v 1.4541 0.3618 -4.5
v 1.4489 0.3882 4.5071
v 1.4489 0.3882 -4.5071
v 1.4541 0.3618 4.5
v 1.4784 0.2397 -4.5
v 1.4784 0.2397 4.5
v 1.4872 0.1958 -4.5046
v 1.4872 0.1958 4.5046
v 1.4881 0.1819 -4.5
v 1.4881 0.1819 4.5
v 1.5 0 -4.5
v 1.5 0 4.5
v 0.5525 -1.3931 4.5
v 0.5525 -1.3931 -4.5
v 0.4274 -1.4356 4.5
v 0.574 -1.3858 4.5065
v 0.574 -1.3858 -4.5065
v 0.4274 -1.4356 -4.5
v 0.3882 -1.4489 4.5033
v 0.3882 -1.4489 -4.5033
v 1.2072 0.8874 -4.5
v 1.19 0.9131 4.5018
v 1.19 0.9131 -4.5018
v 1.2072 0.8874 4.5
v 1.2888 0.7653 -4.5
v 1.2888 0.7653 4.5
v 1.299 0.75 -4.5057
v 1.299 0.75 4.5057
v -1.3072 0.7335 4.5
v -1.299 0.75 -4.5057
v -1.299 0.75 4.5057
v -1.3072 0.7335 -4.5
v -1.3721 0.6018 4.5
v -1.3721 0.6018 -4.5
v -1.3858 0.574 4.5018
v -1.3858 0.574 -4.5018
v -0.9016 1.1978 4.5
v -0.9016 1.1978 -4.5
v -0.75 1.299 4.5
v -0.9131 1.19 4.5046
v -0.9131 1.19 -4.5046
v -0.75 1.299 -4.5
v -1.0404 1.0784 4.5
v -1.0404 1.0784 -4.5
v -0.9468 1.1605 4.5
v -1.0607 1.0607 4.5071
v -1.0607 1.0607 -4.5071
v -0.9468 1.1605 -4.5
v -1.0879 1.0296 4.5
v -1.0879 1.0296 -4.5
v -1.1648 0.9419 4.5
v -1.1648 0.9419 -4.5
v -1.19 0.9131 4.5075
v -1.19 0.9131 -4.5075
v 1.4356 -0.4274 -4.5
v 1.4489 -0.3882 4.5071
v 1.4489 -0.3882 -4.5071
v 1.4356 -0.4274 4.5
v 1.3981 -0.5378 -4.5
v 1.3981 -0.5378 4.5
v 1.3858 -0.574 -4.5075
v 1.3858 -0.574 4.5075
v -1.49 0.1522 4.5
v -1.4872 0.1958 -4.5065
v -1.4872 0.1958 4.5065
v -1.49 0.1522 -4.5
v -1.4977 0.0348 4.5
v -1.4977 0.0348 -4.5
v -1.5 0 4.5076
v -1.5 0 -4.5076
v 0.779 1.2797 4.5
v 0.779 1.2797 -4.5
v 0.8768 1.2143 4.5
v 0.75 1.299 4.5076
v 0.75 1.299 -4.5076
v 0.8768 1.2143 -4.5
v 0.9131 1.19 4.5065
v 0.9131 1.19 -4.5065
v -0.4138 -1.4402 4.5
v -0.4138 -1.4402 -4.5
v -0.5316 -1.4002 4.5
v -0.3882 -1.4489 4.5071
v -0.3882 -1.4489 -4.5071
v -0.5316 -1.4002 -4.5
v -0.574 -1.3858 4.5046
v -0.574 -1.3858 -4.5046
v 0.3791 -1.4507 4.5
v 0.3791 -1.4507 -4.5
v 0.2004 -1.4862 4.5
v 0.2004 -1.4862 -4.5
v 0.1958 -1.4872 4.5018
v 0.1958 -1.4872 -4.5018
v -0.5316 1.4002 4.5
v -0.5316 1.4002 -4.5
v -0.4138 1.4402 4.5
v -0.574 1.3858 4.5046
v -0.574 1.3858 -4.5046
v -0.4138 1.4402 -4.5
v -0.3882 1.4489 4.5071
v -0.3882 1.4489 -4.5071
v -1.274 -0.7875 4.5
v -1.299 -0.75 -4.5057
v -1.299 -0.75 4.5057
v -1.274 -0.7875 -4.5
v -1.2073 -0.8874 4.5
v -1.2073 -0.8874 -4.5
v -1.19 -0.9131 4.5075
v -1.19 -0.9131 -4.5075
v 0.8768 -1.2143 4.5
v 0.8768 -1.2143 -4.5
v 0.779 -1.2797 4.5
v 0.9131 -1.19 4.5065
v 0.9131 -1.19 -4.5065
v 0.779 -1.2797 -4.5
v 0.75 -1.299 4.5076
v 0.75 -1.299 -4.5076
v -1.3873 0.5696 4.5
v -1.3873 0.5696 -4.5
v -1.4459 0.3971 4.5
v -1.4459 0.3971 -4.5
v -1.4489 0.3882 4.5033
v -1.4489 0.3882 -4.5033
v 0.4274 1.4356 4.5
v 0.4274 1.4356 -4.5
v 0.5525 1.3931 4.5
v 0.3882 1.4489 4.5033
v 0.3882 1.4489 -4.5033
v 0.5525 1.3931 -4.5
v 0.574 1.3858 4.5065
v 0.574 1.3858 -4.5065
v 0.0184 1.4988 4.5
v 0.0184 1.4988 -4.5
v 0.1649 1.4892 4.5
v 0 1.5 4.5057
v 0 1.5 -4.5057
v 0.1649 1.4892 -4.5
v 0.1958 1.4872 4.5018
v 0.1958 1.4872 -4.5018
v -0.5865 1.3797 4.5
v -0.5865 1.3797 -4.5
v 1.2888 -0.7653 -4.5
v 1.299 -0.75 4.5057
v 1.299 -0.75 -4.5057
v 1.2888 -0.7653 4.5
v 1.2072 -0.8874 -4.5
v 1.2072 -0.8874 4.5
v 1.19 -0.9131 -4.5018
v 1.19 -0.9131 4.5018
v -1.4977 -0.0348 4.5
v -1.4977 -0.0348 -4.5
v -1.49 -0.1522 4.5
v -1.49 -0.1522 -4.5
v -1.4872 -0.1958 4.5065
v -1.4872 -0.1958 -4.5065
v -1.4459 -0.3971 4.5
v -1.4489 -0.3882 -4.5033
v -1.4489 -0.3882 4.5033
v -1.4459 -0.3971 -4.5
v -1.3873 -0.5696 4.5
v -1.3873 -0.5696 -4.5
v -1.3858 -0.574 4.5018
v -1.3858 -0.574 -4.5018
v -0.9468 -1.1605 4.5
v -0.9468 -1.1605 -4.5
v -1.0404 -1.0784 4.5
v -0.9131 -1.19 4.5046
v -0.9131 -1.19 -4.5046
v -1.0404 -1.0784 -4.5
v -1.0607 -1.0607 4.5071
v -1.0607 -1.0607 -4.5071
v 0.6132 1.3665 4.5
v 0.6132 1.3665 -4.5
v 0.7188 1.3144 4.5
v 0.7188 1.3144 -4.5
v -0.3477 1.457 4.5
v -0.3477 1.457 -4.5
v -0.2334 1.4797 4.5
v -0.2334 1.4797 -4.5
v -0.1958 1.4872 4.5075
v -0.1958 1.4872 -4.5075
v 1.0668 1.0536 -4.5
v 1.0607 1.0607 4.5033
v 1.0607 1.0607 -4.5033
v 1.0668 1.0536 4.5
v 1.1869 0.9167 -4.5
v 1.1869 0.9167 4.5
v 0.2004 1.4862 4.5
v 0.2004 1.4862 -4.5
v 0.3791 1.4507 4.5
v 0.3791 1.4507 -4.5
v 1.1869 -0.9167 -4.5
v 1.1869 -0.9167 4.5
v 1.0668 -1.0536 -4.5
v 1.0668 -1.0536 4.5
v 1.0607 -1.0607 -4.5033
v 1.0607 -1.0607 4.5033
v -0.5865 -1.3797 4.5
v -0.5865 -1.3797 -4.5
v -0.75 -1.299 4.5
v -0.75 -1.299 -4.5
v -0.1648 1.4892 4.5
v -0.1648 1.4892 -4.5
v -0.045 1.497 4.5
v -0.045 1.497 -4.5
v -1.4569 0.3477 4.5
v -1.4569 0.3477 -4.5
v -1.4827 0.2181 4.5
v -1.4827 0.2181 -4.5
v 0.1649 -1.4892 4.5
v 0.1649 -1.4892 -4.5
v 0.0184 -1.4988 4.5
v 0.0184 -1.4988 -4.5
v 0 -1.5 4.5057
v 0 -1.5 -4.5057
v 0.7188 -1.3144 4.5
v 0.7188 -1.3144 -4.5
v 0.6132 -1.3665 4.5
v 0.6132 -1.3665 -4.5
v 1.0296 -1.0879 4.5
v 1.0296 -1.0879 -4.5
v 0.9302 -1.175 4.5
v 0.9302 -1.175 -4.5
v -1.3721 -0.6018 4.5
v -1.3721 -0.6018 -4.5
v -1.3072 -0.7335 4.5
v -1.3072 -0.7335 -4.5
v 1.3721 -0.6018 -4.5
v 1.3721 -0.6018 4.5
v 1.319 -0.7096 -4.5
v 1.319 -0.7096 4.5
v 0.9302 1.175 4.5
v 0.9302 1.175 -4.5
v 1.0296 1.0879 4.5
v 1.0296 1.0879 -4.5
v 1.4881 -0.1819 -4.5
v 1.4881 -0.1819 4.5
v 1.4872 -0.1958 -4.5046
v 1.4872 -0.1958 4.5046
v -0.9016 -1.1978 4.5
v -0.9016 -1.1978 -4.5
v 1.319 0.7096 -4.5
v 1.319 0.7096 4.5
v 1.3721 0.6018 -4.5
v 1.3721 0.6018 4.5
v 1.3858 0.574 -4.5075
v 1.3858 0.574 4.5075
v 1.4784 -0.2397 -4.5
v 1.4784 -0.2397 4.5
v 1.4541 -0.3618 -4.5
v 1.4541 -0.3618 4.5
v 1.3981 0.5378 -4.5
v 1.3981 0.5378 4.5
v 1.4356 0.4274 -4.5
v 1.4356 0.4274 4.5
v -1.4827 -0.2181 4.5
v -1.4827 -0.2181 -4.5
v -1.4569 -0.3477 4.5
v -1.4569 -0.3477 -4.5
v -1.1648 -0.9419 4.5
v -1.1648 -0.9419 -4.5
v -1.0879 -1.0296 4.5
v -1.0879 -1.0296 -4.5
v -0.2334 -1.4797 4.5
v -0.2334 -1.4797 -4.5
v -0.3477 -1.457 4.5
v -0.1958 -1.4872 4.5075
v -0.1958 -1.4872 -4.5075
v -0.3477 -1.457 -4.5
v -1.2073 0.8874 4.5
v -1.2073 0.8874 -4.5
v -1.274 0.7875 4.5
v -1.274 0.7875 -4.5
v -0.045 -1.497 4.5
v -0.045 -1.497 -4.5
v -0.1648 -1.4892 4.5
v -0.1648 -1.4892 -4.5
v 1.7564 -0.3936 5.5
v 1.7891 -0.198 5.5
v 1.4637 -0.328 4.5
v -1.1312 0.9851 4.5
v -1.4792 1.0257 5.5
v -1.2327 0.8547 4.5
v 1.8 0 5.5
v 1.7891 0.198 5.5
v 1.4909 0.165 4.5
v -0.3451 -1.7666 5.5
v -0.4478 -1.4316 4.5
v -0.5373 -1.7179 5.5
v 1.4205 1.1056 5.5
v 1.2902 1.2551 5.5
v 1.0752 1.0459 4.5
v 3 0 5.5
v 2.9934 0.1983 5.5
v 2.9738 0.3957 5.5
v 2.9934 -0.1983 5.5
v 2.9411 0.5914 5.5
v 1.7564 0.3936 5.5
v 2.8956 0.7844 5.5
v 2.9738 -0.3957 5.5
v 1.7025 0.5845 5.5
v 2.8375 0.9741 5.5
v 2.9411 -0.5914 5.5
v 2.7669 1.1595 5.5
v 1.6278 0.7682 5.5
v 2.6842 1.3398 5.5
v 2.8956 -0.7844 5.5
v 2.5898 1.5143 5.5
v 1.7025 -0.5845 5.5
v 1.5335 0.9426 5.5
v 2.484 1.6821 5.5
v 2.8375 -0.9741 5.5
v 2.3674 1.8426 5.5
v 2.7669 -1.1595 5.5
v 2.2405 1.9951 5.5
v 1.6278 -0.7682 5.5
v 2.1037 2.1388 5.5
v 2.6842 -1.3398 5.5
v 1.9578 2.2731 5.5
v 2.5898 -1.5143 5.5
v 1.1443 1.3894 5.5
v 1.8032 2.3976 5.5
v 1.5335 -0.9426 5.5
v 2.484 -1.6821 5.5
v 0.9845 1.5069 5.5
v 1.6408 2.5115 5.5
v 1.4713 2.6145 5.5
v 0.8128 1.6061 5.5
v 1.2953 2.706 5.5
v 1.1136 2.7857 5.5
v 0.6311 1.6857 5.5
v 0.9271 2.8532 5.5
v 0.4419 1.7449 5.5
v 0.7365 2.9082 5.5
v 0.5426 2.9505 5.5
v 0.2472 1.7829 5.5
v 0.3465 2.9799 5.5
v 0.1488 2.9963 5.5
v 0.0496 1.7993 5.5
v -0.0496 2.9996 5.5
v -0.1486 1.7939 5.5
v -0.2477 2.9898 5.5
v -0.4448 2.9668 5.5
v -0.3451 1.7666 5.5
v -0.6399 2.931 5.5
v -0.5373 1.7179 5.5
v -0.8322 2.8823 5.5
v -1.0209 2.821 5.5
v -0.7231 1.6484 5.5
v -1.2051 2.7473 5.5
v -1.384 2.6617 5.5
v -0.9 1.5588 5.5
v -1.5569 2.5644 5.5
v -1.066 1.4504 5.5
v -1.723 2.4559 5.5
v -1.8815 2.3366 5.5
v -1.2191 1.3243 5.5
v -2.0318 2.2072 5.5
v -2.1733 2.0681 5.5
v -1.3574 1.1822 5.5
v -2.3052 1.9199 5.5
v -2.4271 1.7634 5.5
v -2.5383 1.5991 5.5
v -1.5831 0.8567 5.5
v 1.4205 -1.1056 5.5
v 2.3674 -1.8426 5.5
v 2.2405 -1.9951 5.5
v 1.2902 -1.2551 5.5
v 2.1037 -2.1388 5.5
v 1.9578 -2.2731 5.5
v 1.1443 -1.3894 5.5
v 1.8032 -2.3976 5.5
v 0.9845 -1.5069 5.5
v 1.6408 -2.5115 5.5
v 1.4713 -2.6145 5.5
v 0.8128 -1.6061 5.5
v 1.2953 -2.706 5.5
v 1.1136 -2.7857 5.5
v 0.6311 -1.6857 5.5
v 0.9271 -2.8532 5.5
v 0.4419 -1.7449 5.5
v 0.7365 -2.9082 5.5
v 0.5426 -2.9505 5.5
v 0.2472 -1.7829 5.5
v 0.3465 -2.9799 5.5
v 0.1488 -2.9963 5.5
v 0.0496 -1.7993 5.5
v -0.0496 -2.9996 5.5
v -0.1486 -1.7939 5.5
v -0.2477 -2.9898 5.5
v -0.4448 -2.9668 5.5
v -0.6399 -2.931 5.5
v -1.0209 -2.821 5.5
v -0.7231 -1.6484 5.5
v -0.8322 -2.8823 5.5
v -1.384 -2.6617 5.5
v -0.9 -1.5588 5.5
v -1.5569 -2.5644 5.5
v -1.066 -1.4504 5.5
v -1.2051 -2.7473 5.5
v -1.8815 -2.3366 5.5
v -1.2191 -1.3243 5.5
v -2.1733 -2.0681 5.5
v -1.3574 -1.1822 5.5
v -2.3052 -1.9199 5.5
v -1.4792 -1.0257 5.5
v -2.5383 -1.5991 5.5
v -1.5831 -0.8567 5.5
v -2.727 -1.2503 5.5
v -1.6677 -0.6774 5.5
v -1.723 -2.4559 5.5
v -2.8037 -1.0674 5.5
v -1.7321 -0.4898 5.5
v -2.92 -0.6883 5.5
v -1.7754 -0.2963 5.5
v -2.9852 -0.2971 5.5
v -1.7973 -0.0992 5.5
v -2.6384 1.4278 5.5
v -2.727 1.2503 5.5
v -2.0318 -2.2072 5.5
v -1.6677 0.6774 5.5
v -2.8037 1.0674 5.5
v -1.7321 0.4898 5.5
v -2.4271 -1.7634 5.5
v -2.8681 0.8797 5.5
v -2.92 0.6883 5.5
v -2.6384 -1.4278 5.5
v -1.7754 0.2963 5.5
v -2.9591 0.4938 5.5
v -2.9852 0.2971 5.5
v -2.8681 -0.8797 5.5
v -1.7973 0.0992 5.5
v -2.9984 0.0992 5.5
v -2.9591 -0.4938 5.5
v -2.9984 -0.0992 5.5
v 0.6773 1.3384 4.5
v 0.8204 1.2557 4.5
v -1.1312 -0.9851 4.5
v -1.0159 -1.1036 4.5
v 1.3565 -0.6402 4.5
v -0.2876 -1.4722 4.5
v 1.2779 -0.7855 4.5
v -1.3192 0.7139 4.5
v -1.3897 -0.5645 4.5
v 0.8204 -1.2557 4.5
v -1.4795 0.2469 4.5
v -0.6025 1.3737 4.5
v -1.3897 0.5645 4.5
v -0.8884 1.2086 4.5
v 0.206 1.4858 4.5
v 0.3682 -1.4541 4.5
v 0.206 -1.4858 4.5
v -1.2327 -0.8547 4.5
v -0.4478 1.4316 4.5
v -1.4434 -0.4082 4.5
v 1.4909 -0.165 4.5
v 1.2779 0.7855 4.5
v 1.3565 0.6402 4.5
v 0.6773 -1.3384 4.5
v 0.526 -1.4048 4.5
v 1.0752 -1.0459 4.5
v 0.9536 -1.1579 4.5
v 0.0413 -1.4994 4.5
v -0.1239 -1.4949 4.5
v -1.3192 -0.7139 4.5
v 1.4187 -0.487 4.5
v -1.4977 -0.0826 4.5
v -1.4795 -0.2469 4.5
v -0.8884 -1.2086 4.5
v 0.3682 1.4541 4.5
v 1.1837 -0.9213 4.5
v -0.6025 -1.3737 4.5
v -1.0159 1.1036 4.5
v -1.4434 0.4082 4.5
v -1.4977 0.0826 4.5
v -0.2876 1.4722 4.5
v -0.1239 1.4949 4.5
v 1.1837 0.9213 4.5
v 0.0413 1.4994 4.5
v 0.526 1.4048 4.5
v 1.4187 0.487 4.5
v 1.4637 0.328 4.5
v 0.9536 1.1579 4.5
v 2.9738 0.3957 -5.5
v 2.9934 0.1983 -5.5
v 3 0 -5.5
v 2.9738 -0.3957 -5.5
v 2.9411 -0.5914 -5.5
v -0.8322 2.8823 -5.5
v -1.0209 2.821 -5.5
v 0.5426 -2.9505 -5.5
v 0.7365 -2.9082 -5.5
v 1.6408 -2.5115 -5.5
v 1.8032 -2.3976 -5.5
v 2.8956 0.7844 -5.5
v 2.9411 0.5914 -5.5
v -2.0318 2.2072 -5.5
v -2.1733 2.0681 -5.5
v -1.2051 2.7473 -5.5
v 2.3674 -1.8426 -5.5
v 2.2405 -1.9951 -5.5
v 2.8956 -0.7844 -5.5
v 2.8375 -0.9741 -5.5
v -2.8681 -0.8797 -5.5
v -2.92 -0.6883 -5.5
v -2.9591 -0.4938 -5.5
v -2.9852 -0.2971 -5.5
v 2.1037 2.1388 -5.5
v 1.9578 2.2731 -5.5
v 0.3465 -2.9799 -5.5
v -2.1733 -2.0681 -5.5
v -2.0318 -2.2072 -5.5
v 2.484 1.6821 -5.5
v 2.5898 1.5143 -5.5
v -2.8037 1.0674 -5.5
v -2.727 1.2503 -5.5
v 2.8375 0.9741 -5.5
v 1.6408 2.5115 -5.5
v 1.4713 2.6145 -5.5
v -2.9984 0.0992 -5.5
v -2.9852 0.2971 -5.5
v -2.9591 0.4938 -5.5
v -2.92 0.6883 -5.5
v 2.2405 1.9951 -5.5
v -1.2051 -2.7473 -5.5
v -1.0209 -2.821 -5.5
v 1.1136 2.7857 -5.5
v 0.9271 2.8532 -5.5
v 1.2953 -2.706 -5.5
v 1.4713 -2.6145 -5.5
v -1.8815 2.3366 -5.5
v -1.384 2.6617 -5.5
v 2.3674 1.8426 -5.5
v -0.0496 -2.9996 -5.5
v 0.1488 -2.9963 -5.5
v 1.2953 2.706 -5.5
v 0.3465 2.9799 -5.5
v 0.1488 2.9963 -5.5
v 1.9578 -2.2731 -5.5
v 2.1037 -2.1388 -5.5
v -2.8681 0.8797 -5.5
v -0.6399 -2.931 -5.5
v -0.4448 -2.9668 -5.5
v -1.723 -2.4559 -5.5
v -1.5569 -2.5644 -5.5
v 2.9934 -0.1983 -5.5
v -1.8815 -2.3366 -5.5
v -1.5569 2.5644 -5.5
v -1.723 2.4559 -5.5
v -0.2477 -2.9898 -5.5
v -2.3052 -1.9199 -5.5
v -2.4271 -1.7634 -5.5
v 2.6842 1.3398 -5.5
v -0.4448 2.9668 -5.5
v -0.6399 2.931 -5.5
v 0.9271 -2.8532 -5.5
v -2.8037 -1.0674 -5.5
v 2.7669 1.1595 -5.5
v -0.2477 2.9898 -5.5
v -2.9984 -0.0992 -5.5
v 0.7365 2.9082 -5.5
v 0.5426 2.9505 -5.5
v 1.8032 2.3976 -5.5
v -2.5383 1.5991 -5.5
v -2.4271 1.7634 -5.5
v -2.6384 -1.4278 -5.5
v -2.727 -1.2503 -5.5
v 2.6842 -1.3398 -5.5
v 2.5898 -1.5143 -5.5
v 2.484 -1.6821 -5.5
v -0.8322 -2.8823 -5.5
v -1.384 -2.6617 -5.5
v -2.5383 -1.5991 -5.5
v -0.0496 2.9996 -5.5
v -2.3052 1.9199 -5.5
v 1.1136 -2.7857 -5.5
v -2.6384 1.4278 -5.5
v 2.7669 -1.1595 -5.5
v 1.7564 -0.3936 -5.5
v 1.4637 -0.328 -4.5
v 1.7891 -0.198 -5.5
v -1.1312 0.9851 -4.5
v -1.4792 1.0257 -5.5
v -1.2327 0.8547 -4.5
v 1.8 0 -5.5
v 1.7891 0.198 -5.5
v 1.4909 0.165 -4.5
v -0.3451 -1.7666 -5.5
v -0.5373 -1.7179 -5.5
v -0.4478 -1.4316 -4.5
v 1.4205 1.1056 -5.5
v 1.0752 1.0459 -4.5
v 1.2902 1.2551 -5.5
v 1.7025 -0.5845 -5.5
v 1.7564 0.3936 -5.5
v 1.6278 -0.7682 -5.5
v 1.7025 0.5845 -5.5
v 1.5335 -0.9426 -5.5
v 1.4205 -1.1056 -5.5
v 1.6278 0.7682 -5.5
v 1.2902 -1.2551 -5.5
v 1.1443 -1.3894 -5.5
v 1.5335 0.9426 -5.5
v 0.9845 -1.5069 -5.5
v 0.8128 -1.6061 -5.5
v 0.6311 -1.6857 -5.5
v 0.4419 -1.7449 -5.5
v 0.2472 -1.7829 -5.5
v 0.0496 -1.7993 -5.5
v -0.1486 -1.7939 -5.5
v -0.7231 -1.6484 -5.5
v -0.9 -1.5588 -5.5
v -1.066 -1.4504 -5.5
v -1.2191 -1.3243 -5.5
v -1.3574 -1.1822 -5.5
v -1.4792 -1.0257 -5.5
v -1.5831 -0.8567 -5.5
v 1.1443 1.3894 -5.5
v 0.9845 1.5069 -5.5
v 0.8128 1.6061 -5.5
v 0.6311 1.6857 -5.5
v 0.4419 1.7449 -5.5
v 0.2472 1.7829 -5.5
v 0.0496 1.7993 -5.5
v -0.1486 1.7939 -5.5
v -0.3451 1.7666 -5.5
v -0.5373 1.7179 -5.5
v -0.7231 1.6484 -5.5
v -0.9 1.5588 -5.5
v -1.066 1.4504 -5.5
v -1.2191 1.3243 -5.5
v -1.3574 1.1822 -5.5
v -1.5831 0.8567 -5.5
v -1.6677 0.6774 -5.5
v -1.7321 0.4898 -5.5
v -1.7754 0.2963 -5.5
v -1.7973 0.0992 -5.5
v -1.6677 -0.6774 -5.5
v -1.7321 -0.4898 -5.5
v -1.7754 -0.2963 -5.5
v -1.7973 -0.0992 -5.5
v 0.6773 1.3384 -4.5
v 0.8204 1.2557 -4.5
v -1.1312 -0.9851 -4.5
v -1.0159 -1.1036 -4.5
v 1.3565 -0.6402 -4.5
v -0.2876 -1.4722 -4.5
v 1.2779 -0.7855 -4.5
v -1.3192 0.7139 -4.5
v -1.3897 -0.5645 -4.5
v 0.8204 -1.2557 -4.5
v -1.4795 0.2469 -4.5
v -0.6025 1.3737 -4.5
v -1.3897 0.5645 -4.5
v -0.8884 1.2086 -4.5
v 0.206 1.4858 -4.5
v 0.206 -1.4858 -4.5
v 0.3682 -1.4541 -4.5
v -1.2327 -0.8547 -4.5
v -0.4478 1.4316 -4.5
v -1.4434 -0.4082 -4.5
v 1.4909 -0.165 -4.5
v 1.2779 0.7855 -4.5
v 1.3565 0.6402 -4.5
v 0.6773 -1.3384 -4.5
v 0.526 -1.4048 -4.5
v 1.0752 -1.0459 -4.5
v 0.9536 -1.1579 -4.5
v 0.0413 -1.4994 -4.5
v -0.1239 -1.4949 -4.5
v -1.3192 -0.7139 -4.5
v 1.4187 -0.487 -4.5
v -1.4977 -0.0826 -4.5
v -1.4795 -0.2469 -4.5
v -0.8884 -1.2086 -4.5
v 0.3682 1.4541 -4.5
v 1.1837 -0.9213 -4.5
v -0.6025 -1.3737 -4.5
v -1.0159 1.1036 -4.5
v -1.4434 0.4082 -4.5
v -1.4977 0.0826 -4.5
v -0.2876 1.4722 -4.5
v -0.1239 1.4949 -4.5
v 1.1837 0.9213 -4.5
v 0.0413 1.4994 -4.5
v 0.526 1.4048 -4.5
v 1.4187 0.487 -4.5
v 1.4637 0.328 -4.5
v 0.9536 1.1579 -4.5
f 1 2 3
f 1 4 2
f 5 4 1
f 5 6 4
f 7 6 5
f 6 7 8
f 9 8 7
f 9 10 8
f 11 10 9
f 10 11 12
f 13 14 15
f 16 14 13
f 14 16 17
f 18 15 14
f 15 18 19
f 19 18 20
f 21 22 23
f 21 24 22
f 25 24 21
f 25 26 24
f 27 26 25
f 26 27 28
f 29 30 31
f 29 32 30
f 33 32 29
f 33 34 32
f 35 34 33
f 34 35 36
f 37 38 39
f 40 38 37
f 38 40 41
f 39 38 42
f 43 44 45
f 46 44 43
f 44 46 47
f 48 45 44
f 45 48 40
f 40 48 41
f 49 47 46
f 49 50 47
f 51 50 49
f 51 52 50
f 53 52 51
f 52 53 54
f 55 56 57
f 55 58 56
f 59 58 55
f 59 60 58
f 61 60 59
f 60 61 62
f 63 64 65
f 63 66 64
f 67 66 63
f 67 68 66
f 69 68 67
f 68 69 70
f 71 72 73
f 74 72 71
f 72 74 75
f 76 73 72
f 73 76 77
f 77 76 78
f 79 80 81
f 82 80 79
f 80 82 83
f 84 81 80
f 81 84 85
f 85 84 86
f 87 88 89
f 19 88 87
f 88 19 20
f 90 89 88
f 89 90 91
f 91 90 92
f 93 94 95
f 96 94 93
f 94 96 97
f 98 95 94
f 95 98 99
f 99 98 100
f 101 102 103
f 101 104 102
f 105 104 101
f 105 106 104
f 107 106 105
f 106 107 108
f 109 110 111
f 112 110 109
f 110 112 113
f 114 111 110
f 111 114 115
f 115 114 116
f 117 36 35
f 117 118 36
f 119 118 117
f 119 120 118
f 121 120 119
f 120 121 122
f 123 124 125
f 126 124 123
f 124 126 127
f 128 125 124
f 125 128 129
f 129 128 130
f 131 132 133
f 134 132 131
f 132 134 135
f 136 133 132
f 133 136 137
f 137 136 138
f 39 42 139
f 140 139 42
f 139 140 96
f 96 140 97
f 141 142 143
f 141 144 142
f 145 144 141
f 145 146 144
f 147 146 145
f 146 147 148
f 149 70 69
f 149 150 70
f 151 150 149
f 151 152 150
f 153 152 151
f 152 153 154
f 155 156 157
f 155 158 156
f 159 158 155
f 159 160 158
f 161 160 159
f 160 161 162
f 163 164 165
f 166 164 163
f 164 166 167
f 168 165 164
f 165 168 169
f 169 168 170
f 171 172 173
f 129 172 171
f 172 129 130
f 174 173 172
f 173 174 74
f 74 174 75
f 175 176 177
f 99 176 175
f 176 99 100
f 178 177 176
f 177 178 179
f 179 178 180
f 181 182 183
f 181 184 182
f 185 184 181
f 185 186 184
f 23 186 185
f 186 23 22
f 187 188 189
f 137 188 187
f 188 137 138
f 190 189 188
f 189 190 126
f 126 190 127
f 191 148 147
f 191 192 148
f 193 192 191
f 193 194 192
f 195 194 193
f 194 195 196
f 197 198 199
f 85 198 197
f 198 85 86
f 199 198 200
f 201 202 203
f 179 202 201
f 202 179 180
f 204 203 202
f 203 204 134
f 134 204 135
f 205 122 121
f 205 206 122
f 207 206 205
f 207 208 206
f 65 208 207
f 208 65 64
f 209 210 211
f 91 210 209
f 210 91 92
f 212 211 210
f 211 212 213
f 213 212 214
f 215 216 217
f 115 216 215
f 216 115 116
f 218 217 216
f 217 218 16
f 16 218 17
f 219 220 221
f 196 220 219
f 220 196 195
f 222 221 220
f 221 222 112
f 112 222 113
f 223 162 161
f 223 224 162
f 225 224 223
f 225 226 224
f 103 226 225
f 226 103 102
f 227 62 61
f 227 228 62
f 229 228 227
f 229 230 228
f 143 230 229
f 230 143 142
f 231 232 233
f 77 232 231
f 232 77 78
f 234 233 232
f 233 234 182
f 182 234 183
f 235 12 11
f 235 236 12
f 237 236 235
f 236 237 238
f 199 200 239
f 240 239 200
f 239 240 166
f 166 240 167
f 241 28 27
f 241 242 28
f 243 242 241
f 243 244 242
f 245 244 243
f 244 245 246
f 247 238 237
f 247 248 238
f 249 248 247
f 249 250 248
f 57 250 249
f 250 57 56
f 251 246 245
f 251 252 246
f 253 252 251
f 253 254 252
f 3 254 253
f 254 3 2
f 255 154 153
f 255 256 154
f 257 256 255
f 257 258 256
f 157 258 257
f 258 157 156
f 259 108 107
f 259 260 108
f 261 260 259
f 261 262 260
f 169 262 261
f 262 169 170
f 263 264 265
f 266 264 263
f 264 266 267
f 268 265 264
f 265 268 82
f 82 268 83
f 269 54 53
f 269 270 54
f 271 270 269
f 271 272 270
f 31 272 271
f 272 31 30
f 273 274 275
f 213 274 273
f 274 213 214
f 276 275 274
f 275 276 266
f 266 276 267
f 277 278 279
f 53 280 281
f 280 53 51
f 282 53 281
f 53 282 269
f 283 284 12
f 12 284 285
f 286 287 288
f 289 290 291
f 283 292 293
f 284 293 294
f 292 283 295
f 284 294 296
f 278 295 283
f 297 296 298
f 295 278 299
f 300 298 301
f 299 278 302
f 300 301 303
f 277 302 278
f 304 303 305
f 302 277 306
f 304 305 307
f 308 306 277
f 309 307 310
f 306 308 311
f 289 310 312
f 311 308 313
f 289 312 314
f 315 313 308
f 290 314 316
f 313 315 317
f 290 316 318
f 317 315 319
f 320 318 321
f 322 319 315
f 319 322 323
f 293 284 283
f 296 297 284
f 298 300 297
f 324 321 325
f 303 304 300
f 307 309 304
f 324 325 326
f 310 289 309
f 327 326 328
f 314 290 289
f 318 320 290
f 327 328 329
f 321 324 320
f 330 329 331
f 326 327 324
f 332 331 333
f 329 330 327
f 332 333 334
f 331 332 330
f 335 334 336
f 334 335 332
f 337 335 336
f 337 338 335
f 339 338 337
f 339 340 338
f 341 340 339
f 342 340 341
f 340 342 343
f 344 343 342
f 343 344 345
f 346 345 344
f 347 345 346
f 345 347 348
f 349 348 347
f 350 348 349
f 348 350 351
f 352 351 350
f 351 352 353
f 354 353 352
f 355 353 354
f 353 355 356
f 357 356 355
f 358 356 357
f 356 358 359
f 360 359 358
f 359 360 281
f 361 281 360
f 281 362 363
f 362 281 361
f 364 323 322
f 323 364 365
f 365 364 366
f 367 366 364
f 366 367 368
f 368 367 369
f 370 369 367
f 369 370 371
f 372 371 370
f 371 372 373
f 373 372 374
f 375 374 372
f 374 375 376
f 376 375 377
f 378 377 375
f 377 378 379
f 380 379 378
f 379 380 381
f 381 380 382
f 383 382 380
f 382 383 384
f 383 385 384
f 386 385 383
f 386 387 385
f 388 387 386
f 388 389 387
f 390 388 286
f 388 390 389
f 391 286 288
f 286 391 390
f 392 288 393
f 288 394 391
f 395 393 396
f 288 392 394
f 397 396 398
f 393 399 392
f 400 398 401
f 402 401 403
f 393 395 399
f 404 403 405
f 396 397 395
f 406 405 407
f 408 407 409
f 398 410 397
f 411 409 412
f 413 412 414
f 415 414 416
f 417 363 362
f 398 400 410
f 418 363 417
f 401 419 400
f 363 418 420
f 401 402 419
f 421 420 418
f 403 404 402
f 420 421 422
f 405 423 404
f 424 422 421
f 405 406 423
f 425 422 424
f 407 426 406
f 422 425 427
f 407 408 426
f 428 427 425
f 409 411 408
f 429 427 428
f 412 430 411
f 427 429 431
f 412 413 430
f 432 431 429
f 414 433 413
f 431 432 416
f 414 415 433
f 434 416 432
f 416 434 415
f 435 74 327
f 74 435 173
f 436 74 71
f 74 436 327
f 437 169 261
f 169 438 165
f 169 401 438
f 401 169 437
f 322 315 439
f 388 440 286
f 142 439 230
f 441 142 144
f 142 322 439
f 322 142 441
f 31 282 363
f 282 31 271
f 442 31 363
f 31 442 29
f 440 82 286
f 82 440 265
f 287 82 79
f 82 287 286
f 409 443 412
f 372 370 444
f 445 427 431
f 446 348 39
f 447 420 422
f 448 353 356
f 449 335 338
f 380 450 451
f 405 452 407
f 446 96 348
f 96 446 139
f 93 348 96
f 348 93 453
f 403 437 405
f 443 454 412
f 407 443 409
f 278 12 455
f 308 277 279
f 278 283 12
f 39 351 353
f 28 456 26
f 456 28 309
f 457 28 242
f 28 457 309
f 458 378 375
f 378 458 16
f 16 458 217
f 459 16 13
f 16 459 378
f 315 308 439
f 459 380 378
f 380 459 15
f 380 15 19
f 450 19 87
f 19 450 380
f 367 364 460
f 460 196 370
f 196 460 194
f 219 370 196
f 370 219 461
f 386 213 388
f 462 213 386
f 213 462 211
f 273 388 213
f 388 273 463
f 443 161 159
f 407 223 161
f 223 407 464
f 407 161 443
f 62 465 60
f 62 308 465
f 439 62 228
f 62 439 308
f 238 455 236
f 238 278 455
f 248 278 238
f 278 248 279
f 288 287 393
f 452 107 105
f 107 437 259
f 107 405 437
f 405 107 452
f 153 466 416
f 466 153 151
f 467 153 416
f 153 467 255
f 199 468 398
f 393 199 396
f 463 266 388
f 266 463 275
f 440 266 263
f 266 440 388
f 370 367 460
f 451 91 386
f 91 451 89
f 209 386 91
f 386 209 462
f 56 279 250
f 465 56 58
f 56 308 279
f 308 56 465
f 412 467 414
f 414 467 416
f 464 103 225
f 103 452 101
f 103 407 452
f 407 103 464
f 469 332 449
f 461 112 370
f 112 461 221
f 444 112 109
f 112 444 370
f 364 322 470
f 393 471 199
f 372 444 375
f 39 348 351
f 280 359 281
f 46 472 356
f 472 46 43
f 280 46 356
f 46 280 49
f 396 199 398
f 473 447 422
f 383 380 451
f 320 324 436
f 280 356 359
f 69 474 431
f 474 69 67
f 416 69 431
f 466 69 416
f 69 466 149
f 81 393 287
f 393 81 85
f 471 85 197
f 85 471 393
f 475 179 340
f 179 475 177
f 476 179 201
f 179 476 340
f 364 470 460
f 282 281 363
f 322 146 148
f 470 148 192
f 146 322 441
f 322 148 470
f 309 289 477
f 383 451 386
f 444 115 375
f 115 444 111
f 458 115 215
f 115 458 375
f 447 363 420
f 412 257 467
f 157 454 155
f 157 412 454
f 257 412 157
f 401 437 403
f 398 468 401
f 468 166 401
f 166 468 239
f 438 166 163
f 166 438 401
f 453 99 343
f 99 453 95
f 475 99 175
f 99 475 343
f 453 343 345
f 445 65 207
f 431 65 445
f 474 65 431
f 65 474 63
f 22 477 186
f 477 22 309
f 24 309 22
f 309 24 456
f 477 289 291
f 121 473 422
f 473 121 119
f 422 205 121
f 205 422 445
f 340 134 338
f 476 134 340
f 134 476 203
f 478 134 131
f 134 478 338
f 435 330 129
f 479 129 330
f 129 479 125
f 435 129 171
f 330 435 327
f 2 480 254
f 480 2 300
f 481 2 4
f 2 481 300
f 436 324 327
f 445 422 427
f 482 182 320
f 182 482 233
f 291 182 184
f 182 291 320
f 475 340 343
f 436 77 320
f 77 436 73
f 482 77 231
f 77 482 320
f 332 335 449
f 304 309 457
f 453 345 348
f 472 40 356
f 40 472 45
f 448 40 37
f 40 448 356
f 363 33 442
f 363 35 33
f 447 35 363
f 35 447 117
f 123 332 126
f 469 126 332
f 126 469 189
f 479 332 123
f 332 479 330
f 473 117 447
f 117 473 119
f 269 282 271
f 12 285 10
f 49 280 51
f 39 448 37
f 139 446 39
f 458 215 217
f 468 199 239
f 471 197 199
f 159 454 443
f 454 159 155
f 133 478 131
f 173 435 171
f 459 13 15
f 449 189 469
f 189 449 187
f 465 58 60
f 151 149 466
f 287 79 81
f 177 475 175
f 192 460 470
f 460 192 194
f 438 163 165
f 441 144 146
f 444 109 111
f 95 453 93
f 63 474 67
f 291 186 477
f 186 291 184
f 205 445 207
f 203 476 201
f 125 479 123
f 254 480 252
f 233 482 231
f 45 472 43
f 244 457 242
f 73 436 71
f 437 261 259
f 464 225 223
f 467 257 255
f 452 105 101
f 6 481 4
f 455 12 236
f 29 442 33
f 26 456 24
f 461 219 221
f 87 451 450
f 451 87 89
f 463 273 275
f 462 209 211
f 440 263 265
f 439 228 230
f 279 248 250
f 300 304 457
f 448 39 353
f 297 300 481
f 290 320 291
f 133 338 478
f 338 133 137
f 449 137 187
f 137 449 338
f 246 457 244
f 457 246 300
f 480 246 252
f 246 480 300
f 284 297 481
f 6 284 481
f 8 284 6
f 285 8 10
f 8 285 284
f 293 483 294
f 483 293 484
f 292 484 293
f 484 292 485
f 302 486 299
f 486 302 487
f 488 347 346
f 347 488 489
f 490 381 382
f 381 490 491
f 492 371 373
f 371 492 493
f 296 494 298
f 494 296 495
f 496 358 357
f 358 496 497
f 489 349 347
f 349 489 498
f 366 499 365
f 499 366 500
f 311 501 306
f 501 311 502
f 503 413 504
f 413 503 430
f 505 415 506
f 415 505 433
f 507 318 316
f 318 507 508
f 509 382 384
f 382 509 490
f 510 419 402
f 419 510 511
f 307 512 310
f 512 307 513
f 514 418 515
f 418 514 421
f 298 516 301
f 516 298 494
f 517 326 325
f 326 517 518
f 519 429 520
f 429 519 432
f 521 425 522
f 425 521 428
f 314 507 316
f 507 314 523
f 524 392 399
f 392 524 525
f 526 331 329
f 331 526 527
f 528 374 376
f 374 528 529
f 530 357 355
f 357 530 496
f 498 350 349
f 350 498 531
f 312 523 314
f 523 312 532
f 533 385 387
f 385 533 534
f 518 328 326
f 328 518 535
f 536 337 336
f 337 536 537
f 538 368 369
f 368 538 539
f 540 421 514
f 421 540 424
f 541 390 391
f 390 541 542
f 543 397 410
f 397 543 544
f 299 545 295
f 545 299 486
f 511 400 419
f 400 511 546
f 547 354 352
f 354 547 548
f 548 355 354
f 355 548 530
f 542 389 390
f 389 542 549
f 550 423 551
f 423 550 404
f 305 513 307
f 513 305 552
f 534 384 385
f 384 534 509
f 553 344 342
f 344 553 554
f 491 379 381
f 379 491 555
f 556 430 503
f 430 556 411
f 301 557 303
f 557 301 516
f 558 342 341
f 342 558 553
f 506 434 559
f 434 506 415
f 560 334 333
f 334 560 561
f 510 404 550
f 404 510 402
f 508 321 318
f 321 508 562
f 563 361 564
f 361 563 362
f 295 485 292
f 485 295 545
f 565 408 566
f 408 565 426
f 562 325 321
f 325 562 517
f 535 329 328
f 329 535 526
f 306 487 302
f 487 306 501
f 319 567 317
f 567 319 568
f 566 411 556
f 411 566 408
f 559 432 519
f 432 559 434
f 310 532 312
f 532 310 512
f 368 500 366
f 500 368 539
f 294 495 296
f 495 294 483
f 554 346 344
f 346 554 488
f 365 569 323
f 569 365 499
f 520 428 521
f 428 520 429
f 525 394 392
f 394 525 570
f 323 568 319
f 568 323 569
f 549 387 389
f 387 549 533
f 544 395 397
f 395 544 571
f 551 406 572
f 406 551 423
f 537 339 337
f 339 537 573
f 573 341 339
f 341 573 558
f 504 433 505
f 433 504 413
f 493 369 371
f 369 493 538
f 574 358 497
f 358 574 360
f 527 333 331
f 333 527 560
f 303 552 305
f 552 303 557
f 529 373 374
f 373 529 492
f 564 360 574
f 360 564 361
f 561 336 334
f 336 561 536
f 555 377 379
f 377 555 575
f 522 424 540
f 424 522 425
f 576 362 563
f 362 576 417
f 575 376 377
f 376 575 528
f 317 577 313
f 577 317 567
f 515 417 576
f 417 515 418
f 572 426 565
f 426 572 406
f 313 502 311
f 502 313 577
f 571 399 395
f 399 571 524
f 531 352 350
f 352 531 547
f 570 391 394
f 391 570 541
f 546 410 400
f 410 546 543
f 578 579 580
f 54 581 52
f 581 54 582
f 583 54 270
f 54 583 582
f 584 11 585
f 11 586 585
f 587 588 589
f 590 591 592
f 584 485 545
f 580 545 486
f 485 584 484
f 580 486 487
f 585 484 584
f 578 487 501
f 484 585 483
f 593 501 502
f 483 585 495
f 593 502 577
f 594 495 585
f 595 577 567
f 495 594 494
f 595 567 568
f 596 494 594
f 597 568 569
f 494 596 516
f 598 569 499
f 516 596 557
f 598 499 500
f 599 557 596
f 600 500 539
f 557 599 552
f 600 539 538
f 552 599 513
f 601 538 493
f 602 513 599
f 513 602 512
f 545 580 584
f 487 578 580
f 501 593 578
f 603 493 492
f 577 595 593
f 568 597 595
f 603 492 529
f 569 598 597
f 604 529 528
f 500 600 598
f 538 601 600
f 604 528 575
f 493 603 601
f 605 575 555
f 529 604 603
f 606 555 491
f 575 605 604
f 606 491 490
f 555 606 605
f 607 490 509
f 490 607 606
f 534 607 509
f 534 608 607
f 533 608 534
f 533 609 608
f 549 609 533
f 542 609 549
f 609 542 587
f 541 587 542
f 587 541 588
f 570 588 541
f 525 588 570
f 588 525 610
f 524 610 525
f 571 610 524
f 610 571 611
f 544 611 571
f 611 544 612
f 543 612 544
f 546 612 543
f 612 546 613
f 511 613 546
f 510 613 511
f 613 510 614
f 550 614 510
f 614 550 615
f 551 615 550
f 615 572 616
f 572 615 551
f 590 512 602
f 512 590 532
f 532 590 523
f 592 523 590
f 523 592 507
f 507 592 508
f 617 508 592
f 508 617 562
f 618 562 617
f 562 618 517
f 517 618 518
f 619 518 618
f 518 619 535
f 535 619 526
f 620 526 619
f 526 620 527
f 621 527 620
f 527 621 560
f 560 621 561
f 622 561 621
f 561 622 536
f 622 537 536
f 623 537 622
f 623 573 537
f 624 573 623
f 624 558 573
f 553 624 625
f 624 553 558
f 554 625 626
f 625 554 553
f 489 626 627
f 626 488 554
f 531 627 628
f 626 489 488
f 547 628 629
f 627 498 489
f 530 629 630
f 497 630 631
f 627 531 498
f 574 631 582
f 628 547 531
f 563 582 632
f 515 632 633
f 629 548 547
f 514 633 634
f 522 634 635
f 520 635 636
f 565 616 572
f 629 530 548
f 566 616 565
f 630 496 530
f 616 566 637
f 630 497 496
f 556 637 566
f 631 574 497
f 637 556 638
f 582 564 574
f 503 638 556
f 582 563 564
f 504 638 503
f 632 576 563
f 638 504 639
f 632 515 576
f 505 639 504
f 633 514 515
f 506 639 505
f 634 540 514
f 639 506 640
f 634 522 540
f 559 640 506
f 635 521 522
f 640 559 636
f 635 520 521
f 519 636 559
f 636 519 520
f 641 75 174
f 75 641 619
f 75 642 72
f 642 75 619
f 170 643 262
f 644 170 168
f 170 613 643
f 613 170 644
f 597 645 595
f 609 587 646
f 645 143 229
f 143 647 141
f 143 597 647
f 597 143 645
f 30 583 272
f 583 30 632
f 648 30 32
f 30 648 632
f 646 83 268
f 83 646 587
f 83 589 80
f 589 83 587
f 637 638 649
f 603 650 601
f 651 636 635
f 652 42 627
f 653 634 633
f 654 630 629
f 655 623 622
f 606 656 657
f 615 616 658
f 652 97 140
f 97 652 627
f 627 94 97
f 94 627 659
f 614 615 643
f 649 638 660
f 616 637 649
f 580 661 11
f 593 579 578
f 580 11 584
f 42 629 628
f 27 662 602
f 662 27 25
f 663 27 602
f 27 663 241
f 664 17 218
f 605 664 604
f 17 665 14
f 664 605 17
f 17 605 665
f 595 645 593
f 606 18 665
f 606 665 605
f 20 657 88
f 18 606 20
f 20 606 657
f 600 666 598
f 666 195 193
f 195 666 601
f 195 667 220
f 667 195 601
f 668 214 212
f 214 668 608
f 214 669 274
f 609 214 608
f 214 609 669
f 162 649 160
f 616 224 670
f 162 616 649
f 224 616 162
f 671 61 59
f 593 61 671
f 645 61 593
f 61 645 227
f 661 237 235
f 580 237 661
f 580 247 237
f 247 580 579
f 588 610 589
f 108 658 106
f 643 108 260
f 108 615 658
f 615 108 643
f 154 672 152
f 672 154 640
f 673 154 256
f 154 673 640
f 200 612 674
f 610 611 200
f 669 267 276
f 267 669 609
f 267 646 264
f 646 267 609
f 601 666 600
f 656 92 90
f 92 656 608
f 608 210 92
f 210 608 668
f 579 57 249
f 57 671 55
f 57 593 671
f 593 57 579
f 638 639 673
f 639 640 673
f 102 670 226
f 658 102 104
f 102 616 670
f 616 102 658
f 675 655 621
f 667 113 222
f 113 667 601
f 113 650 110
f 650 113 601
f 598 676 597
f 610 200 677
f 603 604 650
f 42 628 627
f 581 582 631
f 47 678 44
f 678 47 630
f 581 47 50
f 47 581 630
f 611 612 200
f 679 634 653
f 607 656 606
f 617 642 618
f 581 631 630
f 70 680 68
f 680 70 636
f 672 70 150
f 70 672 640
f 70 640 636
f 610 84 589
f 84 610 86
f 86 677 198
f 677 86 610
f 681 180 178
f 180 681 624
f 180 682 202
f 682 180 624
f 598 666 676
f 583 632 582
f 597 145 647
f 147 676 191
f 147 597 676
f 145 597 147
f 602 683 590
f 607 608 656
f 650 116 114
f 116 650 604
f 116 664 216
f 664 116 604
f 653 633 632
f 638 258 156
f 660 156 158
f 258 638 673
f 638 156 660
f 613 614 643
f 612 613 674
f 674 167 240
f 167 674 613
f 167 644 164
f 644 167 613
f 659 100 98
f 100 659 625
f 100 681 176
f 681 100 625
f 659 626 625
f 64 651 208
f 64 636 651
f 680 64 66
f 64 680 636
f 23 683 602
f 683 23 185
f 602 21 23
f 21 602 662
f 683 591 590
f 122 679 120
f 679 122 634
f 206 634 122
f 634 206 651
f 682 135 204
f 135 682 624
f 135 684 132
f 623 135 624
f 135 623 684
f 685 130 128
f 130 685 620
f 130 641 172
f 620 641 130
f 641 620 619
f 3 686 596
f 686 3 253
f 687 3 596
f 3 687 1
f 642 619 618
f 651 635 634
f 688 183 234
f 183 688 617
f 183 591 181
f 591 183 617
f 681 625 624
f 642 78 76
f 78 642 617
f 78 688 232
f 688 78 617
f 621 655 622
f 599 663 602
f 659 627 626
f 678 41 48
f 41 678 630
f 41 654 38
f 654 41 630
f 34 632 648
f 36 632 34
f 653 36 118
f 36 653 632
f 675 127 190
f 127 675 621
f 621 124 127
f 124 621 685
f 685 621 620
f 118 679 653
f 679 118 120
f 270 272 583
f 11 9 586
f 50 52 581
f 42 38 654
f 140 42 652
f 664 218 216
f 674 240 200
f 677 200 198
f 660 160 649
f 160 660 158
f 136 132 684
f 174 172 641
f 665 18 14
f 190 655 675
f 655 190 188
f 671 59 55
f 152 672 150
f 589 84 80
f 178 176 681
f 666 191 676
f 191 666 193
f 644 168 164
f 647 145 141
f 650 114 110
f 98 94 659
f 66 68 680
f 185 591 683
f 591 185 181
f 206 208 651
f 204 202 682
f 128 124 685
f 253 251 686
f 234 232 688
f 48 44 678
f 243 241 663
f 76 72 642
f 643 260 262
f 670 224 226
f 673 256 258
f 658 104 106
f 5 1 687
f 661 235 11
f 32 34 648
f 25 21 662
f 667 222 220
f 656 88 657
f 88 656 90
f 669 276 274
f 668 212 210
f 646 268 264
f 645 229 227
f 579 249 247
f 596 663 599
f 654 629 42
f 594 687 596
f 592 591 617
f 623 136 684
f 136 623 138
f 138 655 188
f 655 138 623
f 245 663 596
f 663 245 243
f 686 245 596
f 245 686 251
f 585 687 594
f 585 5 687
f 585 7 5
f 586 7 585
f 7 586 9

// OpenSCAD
//Module to create a knurl pocket suitable for Heat-set inserts

// Articles about knurl insert
//https://hackaday.com/2019/02/28/threading-3d-printed-parts-how-to-use-heat-set-inserts/
//https://clevercreations.org/brass-threaded-inserts-plastic-3d-printing/

//Global vars
$fa = 1;
$fs = 0.2;
knurl_radius = 2.5;
knurl_m2_radius = 1.5;
knurl_wall = 2.5;


module m3knurl_ring(knurl_depth = 5)
{

    difference() {   
        cylinder(h=knurl_depth, r=knurl_radius+knurl_wall,center=true);
        m3knurl_pocket(knurl_depth = 5);
    }   
}

module m3knurl_pocket(knurl_depth = 5)
{
 union() {
    cylinder(h=knurl_depth+0.001, r=knurl_radius, center=true);
    translate([0,0,0.4*knurl_depth])
        cylinder(h=0.25 * knurl_depth, r1=knurl_radius, r2=1.2*knurl_radius, center=true);
 }
}





module m2knurl_ring(knurl_depth = 5)
{
    knurl_m2_wall=1.5;
    difference() {   
        cylinder(h=knurl_depth, r=knurl_m2_radius+knurl_m2_wall,center=true);
        m2knurl_pocket(knurl_depth);
    }   
}


module m2knurl_pocket(knurl_depth = 5)
{
 set_depth=1;
 union() {
    cylinder(h=knurl_depth+0.001, r=knurl_m2_radius, center=true);
    translate([0,0,(knurl_depth-set_depth)/2])
        cylinder(h=set_depth, r1=knurl_m2_radius, r2=1.2*knurl_m2_radius, center=true);
 }
}

module standoff_m2(height=11)
{
  translate([0,0,height/4])m2knurl_ring(height/2);
  translate([0,0,-height/4])mirror([0,0,1])m2knurl_ring(height/2);
}

//m3knurl_ring();
//translate([10,0,0]) m3knurl_pocket();
//translate([0,10,0]) m2knurl_ring(11);
//translate([10,10,0]) m2knurl_pocket();

standoff_m2(11);
